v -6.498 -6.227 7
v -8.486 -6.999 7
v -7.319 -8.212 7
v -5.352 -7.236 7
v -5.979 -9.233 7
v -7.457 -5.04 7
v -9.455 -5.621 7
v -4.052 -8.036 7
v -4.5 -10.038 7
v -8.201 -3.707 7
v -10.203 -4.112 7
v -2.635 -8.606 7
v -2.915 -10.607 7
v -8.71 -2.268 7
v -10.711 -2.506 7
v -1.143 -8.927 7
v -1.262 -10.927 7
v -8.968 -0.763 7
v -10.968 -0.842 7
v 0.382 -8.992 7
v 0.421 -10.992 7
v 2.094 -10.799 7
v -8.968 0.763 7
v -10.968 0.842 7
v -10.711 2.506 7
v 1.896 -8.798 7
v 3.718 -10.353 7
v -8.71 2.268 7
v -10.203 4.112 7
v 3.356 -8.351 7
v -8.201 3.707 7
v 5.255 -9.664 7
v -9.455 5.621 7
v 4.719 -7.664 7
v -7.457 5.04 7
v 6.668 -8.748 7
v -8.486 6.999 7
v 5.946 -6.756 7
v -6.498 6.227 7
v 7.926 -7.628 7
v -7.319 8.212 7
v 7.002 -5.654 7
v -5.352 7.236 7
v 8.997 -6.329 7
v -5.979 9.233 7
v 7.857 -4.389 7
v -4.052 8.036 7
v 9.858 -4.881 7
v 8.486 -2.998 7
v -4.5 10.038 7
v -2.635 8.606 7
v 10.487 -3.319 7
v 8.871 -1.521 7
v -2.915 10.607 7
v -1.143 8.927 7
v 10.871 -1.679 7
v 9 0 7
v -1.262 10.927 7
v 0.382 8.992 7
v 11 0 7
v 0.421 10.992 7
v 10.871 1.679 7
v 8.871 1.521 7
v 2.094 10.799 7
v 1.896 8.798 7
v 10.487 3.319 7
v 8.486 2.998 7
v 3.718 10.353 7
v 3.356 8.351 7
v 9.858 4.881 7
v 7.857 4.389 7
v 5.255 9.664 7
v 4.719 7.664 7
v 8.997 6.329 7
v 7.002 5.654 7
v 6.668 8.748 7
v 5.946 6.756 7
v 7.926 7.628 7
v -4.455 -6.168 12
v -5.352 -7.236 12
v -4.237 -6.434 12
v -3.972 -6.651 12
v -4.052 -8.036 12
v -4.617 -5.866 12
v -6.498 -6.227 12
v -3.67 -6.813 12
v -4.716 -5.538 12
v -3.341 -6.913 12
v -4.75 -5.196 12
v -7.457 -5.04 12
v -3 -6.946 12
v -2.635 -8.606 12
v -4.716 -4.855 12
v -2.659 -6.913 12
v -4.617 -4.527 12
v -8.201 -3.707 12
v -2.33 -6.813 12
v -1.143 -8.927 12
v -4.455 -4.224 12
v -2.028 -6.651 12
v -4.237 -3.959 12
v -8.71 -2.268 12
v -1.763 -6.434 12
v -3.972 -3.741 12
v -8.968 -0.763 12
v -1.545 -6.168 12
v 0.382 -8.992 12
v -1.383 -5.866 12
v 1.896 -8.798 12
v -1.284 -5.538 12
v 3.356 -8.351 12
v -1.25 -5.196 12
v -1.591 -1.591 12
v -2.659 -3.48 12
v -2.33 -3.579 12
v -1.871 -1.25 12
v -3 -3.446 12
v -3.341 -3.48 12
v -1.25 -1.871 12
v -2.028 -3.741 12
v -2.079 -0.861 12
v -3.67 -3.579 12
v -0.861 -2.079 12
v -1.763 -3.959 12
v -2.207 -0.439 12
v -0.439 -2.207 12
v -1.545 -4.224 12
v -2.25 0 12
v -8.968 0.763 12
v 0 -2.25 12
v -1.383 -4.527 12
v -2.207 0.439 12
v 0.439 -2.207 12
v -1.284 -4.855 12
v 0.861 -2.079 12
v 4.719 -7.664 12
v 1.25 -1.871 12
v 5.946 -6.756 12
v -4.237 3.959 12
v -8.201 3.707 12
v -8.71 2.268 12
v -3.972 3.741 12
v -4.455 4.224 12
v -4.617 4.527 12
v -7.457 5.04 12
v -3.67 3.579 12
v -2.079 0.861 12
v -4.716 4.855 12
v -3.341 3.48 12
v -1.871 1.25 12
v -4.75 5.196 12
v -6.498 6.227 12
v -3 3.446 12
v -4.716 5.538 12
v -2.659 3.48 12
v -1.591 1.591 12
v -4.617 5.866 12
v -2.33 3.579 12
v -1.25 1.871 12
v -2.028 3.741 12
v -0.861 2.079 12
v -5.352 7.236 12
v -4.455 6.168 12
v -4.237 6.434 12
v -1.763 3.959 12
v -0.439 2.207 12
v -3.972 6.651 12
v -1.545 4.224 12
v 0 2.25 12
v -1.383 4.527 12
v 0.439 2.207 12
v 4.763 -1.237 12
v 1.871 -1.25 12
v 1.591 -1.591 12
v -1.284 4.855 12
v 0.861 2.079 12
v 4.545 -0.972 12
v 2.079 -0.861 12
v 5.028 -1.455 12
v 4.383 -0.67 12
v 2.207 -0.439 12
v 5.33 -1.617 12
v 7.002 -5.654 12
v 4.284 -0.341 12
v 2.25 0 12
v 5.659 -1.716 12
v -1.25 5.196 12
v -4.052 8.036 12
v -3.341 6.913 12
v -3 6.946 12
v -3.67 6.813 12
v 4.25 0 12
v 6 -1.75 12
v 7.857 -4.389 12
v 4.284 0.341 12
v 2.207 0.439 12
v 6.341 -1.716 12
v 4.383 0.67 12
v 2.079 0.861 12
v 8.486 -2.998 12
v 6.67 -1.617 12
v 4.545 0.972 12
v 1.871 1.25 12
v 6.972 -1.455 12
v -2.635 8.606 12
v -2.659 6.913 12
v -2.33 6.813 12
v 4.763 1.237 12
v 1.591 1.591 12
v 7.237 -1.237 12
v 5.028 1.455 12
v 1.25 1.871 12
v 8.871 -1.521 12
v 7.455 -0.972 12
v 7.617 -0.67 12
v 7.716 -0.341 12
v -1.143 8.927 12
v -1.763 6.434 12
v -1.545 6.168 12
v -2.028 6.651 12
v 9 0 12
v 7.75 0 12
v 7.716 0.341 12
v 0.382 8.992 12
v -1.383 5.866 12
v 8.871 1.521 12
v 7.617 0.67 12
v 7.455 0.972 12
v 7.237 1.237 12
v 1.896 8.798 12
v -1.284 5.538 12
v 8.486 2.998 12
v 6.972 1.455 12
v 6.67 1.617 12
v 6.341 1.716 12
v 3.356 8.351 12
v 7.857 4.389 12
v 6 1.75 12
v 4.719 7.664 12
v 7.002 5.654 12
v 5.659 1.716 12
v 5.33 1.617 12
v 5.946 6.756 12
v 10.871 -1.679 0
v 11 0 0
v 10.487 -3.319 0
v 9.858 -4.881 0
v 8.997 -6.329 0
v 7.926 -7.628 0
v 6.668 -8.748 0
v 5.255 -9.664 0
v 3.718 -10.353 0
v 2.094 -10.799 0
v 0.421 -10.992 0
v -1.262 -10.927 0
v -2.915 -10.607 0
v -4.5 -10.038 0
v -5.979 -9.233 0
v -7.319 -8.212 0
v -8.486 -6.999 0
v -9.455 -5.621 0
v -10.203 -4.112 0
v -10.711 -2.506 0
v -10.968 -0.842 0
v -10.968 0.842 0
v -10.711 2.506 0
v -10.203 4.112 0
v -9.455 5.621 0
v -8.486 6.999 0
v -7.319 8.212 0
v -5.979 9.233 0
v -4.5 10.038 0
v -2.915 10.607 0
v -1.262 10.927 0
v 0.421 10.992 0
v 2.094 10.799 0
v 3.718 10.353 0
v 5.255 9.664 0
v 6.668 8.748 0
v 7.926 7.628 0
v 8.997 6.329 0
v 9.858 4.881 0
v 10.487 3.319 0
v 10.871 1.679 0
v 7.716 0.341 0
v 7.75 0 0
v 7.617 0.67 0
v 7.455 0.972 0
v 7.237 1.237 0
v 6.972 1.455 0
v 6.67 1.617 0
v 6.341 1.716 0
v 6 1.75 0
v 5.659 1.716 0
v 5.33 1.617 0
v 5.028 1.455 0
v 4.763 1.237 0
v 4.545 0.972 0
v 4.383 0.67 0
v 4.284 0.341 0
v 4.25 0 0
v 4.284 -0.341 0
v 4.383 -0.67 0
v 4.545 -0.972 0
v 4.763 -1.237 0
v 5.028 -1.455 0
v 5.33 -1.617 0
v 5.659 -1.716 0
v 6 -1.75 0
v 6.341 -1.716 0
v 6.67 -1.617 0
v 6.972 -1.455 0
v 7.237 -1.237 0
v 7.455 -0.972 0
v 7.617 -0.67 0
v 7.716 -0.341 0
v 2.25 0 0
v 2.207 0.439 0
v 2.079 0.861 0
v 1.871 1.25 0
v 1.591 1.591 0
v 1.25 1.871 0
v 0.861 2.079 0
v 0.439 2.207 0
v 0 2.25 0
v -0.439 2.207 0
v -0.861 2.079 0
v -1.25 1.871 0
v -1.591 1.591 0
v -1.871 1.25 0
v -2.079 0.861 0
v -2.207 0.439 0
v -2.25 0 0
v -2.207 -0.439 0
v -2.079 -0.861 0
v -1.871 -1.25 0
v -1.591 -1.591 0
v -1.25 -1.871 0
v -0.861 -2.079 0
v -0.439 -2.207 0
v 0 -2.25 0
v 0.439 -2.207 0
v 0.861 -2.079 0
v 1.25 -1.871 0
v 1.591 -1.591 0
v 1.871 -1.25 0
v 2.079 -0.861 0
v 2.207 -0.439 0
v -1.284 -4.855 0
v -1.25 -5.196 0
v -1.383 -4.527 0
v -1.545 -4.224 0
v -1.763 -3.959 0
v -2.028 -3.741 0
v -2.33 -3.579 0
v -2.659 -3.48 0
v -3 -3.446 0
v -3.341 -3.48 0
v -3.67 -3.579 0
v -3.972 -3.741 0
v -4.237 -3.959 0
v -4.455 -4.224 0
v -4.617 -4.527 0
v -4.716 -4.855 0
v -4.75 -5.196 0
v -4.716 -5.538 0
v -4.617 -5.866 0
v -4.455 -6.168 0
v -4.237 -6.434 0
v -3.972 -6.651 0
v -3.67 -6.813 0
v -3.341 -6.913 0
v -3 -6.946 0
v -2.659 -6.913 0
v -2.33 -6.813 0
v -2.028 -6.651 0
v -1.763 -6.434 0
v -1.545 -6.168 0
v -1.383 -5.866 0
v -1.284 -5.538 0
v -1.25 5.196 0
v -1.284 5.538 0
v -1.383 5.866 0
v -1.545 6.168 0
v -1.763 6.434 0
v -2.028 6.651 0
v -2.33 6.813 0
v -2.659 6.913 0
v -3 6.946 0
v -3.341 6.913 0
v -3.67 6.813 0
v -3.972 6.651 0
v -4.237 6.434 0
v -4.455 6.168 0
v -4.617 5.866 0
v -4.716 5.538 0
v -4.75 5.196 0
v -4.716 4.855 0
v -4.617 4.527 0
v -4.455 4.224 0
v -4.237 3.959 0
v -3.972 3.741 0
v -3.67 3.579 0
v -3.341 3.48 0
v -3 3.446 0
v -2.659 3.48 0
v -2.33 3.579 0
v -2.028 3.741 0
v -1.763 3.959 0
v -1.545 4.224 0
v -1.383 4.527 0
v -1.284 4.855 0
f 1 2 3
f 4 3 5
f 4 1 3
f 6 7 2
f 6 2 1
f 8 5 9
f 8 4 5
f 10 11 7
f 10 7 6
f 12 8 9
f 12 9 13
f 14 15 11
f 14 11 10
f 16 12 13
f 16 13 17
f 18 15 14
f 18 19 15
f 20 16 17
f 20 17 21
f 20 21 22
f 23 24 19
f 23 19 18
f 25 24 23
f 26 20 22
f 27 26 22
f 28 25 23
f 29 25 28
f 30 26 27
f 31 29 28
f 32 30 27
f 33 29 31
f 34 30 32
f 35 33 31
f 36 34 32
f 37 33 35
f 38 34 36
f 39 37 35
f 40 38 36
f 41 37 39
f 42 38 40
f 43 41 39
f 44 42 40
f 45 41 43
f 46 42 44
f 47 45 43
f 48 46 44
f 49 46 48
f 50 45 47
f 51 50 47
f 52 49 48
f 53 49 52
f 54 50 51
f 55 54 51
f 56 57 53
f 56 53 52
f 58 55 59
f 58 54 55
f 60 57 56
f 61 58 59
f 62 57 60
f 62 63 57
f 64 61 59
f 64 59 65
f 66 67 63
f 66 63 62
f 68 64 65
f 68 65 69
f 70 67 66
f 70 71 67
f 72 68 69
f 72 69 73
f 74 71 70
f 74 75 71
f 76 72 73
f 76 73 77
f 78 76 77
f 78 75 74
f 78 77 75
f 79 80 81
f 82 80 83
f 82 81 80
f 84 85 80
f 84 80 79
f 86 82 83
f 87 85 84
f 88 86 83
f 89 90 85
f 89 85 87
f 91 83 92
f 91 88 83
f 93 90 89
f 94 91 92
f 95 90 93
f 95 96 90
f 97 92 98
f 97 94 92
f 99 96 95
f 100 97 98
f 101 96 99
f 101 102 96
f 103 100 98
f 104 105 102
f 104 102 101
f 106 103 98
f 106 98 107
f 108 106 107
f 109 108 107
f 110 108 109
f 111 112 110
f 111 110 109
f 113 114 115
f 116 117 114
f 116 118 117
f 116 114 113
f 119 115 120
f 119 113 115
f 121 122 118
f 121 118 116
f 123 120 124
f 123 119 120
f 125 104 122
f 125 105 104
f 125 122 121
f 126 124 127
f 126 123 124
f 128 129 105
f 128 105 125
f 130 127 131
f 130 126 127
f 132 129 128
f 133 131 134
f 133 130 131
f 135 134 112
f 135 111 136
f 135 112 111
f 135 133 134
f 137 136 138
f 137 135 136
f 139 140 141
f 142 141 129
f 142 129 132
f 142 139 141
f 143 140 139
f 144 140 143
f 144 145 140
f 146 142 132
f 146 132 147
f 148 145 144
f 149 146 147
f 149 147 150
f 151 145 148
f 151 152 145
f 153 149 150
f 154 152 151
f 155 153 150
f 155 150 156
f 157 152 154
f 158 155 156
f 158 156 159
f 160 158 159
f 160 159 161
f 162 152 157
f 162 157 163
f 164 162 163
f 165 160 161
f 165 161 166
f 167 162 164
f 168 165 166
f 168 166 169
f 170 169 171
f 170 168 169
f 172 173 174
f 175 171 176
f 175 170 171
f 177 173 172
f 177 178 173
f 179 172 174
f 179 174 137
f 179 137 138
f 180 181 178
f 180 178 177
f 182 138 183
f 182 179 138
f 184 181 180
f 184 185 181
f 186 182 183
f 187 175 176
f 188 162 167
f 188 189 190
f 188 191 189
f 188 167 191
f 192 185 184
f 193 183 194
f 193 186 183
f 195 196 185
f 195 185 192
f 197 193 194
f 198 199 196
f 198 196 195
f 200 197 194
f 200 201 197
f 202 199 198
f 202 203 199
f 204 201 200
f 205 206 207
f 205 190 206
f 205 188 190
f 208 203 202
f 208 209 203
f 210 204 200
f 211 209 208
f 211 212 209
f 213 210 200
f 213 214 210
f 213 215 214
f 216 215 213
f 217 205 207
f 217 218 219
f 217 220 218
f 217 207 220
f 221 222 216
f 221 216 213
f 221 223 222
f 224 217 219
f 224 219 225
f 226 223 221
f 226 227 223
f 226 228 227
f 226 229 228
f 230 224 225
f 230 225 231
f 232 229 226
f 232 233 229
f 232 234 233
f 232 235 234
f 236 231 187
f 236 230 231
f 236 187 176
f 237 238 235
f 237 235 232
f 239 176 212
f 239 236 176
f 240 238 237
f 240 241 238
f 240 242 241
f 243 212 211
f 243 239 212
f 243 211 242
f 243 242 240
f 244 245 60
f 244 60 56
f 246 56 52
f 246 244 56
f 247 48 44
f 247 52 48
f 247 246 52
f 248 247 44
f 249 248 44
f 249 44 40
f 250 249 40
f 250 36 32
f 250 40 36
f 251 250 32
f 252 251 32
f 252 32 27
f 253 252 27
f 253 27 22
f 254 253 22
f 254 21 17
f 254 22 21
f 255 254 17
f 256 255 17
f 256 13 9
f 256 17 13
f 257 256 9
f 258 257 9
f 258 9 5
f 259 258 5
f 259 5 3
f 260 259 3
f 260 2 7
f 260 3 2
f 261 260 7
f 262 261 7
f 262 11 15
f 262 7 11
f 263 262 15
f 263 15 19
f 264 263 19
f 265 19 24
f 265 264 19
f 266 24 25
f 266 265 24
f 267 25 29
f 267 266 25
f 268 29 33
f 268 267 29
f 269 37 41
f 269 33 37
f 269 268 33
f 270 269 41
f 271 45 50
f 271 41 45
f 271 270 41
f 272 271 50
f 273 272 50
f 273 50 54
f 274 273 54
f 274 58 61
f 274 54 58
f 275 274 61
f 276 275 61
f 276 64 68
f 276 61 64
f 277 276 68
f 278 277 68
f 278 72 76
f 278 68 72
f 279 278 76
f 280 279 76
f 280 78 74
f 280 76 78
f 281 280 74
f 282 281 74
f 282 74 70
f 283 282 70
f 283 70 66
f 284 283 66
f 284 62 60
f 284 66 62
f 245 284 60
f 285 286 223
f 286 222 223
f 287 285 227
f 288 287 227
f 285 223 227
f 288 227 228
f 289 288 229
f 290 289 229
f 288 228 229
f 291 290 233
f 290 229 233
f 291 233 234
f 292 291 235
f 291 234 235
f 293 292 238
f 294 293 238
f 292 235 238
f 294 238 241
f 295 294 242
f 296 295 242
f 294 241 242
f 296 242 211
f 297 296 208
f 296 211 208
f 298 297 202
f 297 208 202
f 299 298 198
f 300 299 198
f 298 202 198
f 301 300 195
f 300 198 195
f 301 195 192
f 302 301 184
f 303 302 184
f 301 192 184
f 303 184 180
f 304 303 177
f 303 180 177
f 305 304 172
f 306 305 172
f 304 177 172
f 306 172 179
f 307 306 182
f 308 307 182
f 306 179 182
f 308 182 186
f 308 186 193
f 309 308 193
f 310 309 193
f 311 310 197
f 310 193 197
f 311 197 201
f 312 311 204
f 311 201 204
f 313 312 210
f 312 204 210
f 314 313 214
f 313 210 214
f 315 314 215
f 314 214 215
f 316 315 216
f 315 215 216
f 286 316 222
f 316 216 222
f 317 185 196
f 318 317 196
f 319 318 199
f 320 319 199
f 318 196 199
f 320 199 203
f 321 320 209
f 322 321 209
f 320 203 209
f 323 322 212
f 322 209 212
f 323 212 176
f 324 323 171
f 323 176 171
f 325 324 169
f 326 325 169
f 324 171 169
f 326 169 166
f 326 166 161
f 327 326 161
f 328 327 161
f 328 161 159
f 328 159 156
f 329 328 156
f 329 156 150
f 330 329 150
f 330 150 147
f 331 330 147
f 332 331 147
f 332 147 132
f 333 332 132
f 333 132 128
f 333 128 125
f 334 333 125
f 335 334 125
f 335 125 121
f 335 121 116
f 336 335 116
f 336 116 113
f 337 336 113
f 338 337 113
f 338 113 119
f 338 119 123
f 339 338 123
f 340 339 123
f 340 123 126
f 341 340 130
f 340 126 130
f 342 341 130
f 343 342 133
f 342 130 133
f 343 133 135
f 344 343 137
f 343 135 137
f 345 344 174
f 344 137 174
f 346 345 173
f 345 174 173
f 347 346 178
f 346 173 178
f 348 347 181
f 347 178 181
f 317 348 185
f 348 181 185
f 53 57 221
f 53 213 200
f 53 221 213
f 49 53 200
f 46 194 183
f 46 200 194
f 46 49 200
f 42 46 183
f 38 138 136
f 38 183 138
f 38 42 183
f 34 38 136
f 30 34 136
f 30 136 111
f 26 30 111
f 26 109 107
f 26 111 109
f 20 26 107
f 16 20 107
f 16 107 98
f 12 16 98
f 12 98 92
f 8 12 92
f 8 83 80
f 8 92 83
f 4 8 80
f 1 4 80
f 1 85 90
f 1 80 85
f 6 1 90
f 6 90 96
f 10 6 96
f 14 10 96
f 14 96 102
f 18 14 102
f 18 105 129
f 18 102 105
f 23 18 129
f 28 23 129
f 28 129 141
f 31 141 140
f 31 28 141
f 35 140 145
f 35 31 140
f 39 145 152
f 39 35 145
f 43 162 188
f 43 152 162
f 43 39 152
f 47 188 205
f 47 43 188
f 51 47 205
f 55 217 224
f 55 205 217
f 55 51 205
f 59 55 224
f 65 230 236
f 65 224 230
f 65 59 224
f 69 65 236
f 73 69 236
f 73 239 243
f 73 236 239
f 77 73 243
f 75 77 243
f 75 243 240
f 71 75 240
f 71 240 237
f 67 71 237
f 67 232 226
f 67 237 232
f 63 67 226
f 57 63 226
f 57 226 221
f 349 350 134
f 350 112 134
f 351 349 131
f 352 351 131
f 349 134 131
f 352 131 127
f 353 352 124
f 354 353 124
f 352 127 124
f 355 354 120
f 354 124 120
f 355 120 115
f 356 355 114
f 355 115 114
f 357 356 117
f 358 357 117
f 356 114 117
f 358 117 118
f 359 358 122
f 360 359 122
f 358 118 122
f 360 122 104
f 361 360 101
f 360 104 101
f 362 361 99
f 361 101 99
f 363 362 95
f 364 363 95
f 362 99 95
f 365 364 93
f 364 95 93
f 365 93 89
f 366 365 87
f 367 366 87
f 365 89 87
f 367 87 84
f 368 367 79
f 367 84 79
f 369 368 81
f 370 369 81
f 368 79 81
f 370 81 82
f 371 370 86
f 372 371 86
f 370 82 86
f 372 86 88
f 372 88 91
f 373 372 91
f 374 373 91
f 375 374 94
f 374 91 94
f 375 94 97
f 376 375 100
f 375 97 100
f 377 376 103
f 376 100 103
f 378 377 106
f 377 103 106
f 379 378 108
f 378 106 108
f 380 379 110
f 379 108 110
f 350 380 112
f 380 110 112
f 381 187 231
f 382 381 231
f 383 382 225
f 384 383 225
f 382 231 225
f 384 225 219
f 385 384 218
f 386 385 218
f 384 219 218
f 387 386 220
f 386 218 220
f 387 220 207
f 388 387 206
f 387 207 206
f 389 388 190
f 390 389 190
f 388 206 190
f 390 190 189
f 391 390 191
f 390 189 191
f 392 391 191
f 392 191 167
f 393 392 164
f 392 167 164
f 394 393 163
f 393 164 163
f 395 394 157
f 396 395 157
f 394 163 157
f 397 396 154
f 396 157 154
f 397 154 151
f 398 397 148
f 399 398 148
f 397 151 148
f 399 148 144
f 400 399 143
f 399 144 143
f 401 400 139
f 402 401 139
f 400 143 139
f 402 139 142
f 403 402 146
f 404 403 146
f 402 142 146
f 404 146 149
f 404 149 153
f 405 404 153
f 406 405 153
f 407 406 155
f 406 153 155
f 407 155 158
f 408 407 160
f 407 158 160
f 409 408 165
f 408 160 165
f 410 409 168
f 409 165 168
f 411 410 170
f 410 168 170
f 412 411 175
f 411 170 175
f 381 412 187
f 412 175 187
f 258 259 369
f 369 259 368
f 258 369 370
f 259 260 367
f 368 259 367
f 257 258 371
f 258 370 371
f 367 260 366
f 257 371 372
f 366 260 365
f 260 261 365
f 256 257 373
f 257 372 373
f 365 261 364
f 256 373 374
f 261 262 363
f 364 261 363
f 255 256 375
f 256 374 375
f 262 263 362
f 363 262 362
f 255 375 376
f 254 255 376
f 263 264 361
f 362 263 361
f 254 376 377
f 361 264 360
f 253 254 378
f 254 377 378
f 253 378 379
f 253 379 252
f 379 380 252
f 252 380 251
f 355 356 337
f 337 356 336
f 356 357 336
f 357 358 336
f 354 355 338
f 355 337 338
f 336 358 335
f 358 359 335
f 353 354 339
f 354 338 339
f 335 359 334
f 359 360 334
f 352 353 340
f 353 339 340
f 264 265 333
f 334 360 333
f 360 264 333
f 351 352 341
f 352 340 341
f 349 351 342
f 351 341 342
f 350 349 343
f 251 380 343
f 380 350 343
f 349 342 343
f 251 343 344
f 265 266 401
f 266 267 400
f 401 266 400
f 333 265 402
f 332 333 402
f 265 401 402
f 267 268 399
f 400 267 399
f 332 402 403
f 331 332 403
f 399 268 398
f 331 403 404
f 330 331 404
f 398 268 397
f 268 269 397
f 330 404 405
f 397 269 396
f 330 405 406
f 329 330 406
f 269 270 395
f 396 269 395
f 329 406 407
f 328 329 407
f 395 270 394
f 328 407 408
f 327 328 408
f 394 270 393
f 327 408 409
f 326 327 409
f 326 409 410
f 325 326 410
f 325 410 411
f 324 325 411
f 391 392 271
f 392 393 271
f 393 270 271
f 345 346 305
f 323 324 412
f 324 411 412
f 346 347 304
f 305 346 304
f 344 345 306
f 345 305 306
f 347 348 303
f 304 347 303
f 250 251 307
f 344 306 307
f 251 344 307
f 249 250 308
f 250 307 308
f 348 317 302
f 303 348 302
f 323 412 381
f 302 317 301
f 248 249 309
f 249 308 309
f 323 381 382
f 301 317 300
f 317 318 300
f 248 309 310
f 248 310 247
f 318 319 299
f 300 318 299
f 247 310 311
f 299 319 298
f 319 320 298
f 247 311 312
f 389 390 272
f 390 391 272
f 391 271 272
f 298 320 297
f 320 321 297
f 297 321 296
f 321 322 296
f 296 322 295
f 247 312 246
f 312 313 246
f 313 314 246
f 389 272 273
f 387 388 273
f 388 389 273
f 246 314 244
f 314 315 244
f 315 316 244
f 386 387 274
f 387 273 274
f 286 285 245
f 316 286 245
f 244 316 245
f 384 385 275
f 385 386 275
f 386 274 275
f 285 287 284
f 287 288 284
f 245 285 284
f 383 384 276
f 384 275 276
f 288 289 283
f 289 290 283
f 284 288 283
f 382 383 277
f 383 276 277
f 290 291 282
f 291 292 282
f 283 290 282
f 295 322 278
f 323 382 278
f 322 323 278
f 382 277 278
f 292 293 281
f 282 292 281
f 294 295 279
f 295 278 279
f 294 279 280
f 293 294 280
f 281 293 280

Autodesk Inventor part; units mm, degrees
ref_plane "YZ Plane" through (0, 0, 0) normal (1, 0, 0) x (0, 1, 0)
ref_plane "XZ Plane" through (0, 0, 0) normal (0, 1, 0) x (-1, 0, 0)
ref_plane "XY Plane" through (0, 0, 0) normal (0, 0, 1) x (1, 0, 0)
sketch "Sketch1" plane through (0, 0, 0) normal (0, 0, 1) x (1, 0, 0)
  circle A0 centre (0, 0) radius 11
  dimension "d0" = 22
extrude "Extrusion1" add sketch "Sketch1" along normal blind 7
sketch "Sketch2" plane through (0, 0, 7) normal (0, 0, 1) x (1, 0, 0)
  circle A0 centre (0, 0) radius 9
  dimension "d3" = 18
extrude "Extrusion2" add sketch "Sketch2" along normal blind 5
sketch "Sketch3" plane through (0, 0, 12) normal (0, 0, 1) x (1, 0, 0)
  circle A0 centre (0, 0) radius 2.25
  circle A1 centre (6, 0) radius 1.75
  circle A2 centre (-3, 5.1962) radius 1.75
  circle A3 centre (-3, -5.1962) radius 1.75
  dimension "d6" = 4.5
  dimension "d7" = 3.5
  dimension "d8" = 6
  dimension "d11" = 360
extrude "Extrusion3" cut sketch "Sketch3" against normal through all
properties part number "WA005" material "Aluminum 6061"
